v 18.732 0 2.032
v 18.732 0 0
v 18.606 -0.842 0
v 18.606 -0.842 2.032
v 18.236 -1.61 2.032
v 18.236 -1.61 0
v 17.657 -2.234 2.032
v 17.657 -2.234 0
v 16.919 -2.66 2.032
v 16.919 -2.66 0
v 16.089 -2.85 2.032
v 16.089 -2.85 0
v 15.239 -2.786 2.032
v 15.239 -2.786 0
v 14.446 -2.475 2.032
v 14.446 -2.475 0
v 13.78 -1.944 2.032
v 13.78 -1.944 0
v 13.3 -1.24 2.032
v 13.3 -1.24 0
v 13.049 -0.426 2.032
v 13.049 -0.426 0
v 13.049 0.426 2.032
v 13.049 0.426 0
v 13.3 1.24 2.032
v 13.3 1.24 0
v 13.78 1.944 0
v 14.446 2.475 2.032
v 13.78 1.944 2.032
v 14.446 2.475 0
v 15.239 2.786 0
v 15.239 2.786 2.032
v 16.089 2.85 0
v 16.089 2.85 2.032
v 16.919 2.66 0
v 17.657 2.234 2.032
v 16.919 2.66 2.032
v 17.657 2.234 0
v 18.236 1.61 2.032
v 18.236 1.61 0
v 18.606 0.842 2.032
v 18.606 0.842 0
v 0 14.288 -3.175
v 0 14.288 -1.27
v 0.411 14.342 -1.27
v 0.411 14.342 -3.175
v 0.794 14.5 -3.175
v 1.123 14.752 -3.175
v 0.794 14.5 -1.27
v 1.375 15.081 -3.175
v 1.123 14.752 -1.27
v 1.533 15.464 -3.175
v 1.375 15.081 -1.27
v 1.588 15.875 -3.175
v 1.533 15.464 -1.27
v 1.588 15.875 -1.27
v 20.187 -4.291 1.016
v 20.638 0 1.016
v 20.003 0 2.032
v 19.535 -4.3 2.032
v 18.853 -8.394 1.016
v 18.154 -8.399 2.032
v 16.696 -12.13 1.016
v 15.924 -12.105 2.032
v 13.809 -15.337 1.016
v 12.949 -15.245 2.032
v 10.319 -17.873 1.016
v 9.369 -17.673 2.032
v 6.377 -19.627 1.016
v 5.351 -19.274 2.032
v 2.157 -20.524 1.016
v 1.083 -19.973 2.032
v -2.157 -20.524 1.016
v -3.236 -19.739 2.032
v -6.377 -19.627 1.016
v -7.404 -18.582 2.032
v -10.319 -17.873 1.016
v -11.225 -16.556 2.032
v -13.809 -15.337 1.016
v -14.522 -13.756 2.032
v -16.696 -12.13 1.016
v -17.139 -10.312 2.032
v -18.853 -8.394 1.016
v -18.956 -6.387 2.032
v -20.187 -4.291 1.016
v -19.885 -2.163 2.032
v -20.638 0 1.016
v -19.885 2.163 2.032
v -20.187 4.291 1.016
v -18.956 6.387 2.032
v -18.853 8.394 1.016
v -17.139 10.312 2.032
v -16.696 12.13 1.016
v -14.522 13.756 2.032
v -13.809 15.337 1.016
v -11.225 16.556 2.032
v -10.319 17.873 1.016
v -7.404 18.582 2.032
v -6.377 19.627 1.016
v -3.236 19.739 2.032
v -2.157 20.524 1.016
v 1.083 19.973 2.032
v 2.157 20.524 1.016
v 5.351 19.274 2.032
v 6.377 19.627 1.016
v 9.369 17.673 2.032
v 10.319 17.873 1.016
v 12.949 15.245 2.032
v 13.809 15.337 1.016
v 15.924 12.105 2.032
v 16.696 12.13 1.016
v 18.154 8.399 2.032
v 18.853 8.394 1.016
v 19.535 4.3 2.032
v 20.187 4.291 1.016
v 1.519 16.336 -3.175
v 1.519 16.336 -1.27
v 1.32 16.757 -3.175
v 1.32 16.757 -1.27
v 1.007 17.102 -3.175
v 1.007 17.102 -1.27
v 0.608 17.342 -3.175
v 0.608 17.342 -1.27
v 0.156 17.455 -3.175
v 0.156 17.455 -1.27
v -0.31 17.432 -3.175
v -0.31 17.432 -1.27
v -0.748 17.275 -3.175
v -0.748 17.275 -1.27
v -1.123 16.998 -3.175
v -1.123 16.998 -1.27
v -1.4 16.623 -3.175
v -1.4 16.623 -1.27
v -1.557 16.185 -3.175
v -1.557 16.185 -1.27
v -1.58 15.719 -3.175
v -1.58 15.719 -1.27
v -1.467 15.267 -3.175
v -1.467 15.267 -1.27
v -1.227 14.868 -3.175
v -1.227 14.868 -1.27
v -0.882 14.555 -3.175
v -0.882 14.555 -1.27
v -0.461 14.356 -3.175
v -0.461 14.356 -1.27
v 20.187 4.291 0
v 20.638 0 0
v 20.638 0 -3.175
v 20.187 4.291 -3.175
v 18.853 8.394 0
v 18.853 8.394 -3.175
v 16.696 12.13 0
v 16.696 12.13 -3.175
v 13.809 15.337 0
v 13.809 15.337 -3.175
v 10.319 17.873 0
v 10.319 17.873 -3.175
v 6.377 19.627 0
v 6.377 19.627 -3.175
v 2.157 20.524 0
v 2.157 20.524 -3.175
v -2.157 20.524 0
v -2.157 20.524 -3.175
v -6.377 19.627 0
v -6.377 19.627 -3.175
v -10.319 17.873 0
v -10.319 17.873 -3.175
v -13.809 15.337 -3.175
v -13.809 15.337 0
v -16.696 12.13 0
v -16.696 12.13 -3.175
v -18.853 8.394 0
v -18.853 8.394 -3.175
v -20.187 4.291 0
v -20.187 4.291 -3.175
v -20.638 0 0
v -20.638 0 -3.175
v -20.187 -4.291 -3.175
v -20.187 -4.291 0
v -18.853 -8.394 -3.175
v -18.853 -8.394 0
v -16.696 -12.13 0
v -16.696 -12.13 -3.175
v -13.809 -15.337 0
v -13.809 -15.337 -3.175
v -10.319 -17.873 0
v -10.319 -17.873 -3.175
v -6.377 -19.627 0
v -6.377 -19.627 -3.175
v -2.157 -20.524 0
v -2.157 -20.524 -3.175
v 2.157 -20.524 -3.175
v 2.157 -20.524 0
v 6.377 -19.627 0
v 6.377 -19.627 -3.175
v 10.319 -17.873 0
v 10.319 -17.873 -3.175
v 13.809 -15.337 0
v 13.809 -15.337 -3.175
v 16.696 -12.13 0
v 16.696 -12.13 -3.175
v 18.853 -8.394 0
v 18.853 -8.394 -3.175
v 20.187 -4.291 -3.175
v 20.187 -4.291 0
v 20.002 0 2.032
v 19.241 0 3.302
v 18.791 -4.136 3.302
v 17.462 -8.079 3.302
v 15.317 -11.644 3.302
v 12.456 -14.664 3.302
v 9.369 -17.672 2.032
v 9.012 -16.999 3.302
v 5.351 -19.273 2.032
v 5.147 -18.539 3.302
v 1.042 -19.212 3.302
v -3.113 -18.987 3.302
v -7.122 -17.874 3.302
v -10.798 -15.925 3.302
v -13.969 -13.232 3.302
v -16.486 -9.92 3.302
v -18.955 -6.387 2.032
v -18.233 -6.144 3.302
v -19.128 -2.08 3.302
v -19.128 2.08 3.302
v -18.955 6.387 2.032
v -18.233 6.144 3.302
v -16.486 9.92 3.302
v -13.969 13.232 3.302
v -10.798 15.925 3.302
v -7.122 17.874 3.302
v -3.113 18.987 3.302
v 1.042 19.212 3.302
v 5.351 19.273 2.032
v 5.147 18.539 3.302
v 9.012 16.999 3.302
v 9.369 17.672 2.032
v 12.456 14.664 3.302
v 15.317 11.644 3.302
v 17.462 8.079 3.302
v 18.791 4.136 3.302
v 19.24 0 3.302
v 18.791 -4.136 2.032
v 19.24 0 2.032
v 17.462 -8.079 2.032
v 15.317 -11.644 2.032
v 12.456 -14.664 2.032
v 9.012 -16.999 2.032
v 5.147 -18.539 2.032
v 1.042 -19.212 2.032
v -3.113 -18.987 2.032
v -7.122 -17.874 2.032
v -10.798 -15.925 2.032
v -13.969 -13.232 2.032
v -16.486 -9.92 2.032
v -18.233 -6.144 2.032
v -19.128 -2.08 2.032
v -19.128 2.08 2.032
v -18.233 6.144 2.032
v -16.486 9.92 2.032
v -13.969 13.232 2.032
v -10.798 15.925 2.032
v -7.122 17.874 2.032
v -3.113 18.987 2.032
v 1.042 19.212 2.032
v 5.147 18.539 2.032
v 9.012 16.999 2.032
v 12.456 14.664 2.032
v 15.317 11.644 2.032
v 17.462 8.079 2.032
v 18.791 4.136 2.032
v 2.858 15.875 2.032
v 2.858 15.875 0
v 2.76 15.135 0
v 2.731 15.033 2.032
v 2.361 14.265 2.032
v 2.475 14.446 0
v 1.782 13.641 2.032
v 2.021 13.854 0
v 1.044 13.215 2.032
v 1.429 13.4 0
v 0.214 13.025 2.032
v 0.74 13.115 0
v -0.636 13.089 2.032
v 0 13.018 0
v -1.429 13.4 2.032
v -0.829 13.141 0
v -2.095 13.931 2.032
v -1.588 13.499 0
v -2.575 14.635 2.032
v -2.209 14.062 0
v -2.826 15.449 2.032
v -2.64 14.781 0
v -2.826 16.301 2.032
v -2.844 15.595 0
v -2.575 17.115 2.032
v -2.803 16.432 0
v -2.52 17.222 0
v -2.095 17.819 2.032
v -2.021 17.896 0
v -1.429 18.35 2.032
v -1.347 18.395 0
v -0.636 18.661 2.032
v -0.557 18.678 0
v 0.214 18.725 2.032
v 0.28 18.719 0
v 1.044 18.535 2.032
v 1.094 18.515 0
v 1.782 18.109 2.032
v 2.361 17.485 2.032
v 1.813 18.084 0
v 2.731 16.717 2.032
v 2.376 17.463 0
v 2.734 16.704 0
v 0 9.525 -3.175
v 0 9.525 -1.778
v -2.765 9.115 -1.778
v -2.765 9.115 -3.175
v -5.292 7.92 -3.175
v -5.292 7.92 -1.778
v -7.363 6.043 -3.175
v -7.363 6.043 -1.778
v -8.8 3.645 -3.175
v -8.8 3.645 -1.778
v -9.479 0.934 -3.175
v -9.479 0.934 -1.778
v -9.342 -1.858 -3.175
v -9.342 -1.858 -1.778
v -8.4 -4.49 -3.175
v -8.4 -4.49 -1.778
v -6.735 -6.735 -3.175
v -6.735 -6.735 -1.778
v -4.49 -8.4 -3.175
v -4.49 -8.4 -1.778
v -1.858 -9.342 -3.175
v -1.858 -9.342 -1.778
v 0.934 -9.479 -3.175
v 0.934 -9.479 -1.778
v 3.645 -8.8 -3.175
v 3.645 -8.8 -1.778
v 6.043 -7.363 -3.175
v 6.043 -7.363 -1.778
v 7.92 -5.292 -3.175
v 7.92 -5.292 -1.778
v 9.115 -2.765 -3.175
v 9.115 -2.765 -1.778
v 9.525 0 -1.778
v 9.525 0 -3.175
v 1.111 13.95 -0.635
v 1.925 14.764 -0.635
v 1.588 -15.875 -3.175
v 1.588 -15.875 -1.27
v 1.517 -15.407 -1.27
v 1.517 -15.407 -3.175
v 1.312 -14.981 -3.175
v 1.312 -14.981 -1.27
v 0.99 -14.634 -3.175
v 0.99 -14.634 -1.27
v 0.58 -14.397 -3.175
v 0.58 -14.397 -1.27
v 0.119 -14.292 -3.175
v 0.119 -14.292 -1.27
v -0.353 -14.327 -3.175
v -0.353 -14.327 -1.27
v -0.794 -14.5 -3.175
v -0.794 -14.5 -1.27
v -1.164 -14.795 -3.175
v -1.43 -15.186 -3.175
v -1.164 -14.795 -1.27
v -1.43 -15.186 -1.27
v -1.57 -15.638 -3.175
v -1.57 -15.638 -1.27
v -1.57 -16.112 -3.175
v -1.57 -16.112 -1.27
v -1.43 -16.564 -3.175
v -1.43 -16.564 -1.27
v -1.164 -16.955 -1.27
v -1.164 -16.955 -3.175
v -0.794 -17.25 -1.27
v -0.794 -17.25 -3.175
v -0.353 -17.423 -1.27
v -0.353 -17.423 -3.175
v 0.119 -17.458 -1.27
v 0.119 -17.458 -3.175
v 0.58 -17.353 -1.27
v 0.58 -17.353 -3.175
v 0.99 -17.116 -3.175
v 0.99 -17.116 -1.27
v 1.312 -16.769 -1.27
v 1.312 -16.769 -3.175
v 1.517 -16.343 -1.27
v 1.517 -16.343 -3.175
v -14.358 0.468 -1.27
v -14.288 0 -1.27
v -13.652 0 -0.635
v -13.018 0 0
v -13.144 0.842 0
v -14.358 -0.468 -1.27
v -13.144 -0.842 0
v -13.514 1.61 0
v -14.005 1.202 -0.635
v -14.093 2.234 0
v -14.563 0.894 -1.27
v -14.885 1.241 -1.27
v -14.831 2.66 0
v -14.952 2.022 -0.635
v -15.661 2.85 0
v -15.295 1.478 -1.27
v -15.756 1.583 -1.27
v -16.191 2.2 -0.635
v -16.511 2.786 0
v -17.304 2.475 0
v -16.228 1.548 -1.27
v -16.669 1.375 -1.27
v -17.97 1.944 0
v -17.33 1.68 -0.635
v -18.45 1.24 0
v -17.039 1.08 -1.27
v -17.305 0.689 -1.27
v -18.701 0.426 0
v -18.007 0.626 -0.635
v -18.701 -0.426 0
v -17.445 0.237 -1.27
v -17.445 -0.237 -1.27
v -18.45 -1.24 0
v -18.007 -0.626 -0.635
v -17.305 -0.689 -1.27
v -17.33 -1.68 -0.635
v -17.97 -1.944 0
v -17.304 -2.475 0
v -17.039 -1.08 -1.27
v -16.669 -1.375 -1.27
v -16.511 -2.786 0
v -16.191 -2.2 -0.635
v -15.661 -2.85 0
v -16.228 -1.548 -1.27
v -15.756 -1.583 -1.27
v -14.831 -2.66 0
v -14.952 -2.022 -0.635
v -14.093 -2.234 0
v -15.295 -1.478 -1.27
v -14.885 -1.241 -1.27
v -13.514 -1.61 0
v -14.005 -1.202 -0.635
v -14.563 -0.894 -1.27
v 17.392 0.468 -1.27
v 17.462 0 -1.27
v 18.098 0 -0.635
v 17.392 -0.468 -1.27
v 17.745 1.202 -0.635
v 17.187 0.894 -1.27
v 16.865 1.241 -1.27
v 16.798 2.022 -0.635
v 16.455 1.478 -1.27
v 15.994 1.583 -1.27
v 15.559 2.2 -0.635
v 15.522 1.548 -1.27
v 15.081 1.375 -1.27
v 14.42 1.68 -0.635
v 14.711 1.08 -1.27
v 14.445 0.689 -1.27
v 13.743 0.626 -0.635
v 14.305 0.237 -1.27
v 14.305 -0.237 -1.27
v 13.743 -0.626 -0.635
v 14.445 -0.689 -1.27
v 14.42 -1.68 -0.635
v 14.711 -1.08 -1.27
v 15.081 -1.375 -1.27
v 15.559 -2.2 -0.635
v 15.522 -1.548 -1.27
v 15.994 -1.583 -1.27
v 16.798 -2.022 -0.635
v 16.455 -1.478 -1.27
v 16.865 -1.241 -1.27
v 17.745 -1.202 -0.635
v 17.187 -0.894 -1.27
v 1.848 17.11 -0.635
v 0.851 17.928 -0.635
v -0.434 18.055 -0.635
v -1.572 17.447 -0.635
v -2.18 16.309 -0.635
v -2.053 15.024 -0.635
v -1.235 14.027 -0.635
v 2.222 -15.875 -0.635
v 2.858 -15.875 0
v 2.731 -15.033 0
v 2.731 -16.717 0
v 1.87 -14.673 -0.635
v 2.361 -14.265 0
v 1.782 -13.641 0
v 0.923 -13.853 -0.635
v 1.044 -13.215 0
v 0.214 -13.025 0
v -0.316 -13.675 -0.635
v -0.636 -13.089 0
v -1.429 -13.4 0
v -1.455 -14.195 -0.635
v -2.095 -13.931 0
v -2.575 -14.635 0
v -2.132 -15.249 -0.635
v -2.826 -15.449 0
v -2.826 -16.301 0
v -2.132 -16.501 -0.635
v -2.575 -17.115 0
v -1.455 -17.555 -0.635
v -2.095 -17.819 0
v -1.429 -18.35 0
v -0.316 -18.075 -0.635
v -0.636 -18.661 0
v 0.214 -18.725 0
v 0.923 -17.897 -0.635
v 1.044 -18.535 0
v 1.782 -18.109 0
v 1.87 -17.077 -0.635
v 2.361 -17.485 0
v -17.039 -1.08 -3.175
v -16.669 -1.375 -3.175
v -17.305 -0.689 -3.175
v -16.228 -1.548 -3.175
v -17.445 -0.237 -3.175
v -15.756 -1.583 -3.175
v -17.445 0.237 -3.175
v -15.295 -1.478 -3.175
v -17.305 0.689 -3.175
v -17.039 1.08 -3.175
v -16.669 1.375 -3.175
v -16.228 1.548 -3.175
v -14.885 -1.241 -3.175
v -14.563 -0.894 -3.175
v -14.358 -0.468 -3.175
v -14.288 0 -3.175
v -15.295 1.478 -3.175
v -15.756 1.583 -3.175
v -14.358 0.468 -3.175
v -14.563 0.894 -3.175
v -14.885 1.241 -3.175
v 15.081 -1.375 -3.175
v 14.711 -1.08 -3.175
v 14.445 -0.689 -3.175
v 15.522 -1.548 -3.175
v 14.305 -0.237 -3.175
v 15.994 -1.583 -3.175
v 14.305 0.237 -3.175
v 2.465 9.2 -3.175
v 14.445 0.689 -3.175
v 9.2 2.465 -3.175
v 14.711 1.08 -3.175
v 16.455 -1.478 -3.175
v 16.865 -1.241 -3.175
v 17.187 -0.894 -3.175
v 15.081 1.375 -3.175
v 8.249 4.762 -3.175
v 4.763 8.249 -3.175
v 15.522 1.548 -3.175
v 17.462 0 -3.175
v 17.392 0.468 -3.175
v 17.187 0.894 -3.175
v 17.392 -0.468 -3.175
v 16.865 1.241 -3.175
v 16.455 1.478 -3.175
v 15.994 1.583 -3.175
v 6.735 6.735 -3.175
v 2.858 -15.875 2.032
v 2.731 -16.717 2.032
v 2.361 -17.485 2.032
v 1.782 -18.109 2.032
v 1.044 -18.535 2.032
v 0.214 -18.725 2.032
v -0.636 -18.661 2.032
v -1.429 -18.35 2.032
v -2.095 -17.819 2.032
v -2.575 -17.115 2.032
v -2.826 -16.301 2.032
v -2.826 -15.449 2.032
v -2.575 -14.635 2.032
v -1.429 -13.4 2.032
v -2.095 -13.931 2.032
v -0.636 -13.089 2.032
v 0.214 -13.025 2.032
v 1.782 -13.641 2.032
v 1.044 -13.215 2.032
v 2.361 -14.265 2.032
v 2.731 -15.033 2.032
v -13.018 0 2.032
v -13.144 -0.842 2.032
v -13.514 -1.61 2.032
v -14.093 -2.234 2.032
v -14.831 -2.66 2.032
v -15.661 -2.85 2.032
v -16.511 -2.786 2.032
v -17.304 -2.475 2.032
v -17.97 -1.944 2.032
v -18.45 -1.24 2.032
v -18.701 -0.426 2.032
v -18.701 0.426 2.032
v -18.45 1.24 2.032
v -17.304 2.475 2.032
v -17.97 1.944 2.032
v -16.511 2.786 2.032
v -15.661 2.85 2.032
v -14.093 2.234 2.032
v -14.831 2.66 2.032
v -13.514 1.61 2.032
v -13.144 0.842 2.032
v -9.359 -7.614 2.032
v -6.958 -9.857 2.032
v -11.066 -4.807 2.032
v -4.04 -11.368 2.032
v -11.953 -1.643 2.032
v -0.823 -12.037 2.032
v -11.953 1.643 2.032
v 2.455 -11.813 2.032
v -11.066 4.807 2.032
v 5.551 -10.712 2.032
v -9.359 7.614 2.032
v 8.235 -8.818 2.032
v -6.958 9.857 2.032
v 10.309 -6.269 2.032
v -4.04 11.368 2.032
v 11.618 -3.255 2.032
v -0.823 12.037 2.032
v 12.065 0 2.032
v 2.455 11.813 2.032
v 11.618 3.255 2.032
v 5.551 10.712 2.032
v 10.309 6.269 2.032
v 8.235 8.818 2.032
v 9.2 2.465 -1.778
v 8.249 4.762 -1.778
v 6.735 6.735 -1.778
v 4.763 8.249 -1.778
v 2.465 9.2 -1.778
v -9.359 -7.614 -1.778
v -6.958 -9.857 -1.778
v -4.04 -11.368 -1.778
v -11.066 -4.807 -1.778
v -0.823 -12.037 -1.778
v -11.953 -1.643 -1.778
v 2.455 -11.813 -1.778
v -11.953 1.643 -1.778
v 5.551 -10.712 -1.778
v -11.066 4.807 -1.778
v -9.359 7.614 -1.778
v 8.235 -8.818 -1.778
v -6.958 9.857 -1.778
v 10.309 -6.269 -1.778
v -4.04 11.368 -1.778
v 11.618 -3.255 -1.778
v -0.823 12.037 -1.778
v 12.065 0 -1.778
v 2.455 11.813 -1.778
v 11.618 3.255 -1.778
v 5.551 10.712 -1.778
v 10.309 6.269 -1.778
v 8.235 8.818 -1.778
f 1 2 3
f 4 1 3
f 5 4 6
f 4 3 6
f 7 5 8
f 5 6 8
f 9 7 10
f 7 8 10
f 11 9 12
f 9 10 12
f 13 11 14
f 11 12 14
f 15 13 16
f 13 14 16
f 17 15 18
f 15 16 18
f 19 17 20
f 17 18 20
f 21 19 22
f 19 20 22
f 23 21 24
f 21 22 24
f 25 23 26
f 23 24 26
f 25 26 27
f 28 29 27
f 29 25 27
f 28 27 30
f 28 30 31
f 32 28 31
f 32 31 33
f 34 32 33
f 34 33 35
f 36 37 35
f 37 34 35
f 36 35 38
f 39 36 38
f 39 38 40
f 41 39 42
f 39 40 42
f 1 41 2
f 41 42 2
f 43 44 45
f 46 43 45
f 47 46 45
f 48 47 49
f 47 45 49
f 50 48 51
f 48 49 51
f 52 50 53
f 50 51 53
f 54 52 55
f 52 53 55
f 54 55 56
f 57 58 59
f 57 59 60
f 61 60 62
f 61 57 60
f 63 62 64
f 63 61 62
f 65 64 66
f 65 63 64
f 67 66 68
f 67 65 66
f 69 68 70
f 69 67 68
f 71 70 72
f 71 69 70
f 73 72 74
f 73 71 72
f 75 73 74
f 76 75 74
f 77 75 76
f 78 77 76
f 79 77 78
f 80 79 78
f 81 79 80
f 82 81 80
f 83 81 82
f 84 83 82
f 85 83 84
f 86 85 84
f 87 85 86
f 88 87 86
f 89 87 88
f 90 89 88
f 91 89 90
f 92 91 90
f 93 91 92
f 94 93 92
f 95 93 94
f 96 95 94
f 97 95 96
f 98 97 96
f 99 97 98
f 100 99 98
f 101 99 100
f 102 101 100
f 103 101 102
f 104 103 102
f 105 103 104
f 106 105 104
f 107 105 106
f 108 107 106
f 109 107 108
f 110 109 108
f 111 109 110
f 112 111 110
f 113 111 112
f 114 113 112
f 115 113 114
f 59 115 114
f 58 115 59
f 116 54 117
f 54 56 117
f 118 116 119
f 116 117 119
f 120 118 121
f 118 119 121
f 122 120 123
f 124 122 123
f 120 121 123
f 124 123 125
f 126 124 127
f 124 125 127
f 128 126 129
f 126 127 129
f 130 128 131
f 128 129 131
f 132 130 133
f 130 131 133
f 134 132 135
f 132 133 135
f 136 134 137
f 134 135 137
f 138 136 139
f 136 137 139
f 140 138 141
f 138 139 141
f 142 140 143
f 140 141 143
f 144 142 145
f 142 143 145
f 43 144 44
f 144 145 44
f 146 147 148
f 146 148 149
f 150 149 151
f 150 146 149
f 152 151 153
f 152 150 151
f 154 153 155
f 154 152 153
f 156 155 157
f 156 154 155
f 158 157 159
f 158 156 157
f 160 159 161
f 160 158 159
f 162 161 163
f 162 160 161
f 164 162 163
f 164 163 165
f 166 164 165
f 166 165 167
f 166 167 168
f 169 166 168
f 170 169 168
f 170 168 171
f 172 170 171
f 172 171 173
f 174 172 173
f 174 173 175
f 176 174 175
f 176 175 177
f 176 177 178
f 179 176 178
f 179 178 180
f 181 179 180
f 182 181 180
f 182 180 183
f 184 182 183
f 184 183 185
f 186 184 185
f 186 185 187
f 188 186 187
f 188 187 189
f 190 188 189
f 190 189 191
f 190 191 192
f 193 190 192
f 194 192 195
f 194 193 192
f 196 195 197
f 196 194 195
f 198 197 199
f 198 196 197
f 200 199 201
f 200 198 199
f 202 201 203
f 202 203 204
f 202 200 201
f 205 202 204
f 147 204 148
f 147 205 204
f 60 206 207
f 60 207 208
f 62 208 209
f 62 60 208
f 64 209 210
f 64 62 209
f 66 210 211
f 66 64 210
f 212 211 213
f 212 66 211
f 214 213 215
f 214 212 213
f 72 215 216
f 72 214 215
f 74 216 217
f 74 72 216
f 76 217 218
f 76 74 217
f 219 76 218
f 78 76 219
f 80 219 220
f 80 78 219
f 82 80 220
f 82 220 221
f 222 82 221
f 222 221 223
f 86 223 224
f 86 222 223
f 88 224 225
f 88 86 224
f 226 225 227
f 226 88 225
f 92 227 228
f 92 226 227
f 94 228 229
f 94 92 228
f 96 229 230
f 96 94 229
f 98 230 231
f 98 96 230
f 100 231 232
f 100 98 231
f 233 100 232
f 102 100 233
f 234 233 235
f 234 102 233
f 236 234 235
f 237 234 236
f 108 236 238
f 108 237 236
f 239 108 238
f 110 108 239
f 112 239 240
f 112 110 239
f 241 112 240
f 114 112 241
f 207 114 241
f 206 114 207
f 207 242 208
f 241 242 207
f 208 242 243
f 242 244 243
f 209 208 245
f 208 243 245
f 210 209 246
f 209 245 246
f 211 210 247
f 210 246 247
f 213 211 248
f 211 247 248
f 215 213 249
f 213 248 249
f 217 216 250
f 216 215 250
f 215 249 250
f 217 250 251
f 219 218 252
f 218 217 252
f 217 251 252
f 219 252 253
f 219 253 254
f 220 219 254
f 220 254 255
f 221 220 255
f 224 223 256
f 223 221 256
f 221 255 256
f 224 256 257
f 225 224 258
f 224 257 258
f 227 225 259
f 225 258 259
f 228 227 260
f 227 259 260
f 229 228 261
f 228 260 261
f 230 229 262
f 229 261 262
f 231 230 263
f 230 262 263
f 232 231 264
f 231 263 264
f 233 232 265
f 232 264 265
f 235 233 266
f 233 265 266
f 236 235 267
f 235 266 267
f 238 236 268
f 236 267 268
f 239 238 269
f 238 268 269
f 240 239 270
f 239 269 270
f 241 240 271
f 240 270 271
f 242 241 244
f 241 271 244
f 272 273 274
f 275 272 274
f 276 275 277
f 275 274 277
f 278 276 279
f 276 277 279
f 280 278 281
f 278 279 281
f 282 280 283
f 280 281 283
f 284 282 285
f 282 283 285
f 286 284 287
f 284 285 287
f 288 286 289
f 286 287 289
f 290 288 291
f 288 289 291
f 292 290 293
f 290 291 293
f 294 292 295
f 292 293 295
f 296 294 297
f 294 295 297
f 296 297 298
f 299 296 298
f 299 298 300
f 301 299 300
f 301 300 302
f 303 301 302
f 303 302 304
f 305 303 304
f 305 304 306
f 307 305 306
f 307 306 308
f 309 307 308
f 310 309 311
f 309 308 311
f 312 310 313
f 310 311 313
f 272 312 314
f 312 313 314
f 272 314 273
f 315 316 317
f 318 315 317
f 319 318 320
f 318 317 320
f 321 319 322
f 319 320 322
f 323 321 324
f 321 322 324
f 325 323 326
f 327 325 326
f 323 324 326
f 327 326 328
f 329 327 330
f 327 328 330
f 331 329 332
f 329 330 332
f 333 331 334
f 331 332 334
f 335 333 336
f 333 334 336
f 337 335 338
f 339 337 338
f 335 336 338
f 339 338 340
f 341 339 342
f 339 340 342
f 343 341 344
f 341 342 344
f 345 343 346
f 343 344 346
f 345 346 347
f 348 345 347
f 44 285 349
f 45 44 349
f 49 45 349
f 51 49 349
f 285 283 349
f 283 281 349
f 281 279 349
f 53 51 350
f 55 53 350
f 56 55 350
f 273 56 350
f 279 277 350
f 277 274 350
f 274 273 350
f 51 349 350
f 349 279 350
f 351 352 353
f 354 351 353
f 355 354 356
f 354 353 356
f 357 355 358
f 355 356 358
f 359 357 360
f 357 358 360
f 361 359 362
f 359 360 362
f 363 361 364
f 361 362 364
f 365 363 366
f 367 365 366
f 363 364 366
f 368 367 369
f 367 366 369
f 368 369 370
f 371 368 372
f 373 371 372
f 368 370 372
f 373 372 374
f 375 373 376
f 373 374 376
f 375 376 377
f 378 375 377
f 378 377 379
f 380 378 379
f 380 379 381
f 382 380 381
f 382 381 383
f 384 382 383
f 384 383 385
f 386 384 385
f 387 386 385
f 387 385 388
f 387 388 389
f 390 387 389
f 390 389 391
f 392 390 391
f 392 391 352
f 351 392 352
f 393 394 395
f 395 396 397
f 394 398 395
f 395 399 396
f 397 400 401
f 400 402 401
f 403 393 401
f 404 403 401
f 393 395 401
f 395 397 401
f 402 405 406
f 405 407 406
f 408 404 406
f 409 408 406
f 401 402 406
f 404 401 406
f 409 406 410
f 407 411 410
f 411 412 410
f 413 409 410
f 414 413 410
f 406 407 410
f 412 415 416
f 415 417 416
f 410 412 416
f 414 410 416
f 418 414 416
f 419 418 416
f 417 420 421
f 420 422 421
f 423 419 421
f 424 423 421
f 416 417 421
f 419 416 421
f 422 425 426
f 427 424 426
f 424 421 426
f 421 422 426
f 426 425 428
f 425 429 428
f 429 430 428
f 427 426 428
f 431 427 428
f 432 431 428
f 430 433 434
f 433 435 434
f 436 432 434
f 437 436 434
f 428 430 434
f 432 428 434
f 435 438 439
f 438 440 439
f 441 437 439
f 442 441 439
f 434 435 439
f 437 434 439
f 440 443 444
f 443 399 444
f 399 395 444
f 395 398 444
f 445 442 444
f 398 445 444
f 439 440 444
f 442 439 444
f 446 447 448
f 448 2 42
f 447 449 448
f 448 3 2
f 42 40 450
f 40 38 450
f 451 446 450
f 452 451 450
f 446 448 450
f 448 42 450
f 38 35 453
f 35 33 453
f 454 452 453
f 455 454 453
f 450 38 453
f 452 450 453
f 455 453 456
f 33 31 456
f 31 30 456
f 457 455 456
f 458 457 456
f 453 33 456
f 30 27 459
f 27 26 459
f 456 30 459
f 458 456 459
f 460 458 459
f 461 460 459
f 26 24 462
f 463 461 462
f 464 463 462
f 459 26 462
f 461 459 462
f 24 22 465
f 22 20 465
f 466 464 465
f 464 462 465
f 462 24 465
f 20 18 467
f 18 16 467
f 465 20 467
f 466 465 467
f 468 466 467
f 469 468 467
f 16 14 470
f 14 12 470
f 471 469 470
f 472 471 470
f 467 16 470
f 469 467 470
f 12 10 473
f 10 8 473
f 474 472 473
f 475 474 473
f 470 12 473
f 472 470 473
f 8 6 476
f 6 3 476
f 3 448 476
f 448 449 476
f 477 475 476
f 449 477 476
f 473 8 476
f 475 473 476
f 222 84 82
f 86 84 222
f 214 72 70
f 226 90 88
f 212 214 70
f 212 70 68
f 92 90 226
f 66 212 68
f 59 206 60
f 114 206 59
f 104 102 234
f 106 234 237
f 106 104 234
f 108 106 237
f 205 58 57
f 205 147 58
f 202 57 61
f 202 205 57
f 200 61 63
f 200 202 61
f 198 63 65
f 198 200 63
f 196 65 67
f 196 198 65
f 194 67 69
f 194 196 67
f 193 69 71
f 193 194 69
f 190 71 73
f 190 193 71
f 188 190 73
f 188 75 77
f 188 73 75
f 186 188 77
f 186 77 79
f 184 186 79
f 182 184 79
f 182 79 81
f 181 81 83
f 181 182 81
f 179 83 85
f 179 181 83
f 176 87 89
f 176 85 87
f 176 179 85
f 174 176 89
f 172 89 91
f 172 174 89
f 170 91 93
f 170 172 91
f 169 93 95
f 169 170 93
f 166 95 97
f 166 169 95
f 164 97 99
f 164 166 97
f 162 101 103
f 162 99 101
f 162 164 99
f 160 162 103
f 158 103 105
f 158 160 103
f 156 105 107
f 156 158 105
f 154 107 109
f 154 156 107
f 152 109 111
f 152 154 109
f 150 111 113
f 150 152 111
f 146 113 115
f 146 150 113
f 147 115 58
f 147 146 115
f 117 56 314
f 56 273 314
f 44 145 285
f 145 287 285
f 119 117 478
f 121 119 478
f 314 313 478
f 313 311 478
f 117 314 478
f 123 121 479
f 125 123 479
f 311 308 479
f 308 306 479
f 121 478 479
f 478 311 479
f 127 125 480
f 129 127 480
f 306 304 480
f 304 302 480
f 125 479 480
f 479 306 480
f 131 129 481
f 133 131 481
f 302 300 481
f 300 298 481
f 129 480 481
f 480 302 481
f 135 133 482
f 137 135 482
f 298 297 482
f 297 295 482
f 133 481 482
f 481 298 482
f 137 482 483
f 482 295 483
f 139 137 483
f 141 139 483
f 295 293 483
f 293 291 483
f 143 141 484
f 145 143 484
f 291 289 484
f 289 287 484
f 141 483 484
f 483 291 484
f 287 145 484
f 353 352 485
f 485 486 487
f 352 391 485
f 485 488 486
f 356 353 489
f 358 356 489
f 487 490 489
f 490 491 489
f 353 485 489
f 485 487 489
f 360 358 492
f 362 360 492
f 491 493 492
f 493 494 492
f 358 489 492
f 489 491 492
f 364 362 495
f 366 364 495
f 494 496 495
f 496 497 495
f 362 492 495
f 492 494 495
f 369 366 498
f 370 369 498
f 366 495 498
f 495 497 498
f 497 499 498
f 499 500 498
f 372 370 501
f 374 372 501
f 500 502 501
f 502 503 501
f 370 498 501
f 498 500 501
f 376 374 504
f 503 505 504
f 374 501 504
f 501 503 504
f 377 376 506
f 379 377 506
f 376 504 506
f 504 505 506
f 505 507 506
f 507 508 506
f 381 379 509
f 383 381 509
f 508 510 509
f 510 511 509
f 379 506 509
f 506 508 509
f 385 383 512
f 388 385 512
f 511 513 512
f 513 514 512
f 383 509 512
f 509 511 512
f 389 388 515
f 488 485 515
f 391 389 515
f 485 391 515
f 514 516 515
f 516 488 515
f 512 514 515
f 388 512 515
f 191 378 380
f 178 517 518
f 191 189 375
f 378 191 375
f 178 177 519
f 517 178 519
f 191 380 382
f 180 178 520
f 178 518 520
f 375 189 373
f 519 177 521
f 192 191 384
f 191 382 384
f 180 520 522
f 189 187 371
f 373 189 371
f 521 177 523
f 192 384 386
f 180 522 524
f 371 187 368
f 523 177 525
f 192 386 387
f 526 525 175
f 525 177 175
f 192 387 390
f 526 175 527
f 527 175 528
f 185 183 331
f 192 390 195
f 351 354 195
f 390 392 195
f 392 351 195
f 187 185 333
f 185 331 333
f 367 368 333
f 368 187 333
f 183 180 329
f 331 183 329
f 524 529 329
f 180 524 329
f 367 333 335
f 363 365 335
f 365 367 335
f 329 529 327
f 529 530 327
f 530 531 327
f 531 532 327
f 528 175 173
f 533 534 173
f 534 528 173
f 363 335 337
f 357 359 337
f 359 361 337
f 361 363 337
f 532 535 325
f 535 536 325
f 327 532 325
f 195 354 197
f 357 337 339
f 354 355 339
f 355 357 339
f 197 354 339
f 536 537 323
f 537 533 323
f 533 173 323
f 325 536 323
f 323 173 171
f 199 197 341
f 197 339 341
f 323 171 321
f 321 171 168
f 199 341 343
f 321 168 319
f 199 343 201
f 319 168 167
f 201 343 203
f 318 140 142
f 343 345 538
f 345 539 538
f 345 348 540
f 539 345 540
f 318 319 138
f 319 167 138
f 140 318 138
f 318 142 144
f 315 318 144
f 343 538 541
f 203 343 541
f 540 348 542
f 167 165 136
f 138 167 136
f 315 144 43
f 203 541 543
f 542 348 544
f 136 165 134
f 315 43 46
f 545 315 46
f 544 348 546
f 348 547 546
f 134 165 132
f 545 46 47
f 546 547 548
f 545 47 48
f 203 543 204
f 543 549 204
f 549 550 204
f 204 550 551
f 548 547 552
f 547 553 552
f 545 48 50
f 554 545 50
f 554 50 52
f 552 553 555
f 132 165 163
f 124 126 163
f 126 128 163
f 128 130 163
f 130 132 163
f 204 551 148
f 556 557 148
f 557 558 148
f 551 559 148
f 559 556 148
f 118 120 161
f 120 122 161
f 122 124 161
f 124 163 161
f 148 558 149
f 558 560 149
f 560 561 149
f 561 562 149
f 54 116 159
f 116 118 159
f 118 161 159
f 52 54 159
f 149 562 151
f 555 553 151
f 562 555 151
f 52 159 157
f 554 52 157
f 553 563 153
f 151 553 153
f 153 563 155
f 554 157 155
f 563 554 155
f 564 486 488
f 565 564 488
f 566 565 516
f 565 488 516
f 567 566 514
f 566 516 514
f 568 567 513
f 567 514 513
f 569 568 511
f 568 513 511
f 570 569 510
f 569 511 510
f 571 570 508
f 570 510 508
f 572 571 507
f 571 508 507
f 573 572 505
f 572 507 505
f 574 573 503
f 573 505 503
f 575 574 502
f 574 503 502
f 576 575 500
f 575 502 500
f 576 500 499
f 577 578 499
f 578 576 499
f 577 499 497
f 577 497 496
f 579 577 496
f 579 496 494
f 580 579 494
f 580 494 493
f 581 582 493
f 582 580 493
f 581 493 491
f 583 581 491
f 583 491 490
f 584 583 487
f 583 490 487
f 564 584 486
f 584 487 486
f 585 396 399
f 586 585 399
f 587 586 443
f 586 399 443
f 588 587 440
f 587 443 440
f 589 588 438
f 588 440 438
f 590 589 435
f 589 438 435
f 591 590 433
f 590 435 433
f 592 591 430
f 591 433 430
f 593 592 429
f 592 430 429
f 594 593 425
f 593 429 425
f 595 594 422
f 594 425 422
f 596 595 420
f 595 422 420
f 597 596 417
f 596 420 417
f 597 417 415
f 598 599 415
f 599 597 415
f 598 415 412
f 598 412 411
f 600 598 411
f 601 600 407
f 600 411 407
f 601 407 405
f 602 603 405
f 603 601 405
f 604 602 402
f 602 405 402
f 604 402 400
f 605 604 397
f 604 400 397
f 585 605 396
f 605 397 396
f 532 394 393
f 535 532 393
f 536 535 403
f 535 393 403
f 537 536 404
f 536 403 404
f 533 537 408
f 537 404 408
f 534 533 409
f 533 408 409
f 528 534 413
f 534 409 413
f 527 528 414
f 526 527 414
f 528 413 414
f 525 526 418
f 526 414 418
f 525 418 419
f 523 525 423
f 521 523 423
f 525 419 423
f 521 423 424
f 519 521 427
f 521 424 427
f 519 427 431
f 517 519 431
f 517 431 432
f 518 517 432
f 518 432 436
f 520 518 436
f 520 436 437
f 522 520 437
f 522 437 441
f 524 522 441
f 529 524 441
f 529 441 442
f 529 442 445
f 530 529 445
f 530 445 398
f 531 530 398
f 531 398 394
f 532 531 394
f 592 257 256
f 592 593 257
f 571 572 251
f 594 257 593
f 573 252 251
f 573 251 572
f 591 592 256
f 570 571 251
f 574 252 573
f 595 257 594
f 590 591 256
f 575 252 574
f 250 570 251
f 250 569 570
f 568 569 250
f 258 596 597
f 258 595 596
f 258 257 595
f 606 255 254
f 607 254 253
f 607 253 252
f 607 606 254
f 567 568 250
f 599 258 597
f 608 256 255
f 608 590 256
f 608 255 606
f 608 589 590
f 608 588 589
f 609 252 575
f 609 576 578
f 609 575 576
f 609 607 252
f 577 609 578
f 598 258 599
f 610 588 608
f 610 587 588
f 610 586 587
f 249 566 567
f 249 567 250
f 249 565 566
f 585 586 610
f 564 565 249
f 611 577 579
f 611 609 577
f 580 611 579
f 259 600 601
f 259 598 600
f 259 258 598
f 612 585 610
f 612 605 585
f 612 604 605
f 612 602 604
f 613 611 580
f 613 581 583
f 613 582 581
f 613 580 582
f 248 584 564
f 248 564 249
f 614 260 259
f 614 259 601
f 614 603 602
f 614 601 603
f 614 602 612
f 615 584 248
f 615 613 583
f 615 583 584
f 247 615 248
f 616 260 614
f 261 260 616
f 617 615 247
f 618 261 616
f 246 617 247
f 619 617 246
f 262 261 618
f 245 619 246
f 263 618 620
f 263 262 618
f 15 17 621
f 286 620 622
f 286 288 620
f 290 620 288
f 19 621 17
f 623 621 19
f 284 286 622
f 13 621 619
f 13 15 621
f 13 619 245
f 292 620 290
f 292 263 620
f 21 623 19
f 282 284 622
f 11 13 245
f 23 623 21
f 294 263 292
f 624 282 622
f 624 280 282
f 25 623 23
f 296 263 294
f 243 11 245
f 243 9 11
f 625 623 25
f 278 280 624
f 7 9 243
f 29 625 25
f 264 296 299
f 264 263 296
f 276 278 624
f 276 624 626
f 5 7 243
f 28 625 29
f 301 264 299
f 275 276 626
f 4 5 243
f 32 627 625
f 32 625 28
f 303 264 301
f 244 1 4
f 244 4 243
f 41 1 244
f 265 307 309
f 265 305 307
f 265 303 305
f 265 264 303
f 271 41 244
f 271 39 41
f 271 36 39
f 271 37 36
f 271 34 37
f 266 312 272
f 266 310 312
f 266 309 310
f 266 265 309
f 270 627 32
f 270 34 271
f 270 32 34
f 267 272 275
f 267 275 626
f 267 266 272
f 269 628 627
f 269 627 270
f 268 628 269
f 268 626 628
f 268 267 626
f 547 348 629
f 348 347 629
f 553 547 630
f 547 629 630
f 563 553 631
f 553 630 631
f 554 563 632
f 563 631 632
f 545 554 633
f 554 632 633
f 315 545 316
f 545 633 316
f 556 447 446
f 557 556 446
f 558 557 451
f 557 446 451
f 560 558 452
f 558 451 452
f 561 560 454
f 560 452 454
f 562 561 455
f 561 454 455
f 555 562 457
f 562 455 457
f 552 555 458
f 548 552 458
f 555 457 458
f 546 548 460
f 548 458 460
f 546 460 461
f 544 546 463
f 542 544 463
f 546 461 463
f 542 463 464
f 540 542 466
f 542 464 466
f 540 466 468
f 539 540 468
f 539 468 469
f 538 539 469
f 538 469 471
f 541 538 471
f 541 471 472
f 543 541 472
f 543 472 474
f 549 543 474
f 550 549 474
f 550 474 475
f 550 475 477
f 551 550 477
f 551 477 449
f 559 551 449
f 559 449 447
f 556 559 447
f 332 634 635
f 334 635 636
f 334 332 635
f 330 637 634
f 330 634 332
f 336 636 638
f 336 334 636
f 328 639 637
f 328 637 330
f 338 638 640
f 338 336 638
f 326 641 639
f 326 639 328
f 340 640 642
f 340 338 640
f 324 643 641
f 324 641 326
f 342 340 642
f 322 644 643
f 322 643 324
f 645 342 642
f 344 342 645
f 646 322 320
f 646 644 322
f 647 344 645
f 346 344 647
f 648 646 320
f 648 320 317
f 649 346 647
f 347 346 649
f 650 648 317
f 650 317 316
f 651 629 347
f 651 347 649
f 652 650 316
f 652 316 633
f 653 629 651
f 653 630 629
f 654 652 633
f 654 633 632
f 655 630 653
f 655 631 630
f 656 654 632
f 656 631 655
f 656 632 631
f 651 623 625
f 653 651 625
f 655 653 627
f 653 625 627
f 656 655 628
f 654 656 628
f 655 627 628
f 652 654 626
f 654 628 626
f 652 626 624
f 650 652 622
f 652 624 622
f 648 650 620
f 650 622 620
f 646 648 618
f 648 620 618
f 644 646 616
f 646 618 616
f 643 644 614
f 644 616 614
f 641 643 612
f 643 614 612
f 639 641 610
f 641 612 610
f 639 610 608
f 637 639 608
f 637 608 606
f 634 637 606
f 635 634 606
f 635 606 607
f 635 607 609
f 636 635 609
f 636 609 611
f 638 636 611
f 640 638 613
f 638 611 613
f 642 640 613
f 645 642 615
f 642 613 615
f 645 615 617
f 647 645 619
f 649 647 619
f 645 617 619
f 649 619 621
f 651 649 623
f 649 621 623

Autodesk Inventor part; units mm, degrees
ref_plane "YZ Plane" through (0, 0, 0) normal (1, 0, 0) x (0, 1, 0)
ref_plane "XZ Plane" through (0, 0, 0) normal (0, 1, 0) x (-1, 0, 0)
ref_plane "XY Plane" through (0, 0, 0) normal (0, 0, 1) x (1, 0, 0)
sketch "Sketch1" plane through (0, 0, 0) normal (0, 0, 1) x (1, 0, 0)
  circle A0 centre (0, 0) radius 9.525
  line L0 (0, 0) -> (0, 15.875)
  circle A1 centre (0, 15.875) radius 1.5875
  circle A2 centre (-15.875, 0) radius 1.5875
  circle A3 centre (0, -15.875) radius 1.5875
  circle A4 centre (15.875, 0) radius 1.5875
  circle A5 centre (0, 0) radius 20.6375
  dimension "d0" = 19.05
  dimension "d1" = 15.875
  dimension "d2" = 3.175
  dimension "d5" = 360
  dimension "d7" = 41.275
extrude "Extrusion1" add sketch "Sketch1" against normal blind 3.175
chamfer "Chamfer1" distance 1.27 angle 45 4 edges at (-1.5875, 15.875, 0) (14.2875, 0, 0) (-1.5875, -15.875, 0) (-17.4625, 0, 0)
sketch "Sketch4" plane through (0, 0, 0) normal (0, 0, 1) x (1, 0, 0)
  circle A0 centre (0, -15.875) radius 2.8575 projected
  circle A1 centre (0, 15.875) radius 2.8575 projected
  circle A2 centre (0, 0) radius 9.525 projected
  circle A3 centre (0, 0) radius 20.6375 projected
  circle A4 centre (15.875, 0) radius 2.8575 projected
  circle A5 centre (-15.875, 0) radius 2.8575 projected
extrude "Extrusion3" add sketch "Sketch4" along normal blind 2.032
sketch "Sketch5" plane through (0, 0, 2.032) normal (0, 0, 1) x (1, 0, 0)
  circle A0 centre (0, 0) radius 12.065
  dimension "d17" = 24.13
extrude "Extrusion4" cut sketch "Sketch5" against normal blind 3.81
sketch "Sketch6" plane through (0, 0, 2.032) normal (0, 0, 1) x (1, 0, 0)
  circle A0 centre (0, 0) radius 19.2405
  circle A1 centre (0, 0) radius 20.0025
  dimension "d20" = 38.481
  dimension "d21" = 40.005
extrude "Extrusion5" add sketch "Sketch6" along normal blind 1.27
chamfer "Chamfer2" distance 0.762 distance2 1.27 1 edges at (-20.0025, 0, 3.302) measured on face at (19.3684, -3.1305, 3.302)
chamfer "Chamfer3" distance 0.635 distance2 1.016 1 edges at (-20.6375, 0, 2.032) measured on face at (20.0322, -3.2419, 2.032)
properties part number "RadialBearingMountCover" material "ABS Plastic"
